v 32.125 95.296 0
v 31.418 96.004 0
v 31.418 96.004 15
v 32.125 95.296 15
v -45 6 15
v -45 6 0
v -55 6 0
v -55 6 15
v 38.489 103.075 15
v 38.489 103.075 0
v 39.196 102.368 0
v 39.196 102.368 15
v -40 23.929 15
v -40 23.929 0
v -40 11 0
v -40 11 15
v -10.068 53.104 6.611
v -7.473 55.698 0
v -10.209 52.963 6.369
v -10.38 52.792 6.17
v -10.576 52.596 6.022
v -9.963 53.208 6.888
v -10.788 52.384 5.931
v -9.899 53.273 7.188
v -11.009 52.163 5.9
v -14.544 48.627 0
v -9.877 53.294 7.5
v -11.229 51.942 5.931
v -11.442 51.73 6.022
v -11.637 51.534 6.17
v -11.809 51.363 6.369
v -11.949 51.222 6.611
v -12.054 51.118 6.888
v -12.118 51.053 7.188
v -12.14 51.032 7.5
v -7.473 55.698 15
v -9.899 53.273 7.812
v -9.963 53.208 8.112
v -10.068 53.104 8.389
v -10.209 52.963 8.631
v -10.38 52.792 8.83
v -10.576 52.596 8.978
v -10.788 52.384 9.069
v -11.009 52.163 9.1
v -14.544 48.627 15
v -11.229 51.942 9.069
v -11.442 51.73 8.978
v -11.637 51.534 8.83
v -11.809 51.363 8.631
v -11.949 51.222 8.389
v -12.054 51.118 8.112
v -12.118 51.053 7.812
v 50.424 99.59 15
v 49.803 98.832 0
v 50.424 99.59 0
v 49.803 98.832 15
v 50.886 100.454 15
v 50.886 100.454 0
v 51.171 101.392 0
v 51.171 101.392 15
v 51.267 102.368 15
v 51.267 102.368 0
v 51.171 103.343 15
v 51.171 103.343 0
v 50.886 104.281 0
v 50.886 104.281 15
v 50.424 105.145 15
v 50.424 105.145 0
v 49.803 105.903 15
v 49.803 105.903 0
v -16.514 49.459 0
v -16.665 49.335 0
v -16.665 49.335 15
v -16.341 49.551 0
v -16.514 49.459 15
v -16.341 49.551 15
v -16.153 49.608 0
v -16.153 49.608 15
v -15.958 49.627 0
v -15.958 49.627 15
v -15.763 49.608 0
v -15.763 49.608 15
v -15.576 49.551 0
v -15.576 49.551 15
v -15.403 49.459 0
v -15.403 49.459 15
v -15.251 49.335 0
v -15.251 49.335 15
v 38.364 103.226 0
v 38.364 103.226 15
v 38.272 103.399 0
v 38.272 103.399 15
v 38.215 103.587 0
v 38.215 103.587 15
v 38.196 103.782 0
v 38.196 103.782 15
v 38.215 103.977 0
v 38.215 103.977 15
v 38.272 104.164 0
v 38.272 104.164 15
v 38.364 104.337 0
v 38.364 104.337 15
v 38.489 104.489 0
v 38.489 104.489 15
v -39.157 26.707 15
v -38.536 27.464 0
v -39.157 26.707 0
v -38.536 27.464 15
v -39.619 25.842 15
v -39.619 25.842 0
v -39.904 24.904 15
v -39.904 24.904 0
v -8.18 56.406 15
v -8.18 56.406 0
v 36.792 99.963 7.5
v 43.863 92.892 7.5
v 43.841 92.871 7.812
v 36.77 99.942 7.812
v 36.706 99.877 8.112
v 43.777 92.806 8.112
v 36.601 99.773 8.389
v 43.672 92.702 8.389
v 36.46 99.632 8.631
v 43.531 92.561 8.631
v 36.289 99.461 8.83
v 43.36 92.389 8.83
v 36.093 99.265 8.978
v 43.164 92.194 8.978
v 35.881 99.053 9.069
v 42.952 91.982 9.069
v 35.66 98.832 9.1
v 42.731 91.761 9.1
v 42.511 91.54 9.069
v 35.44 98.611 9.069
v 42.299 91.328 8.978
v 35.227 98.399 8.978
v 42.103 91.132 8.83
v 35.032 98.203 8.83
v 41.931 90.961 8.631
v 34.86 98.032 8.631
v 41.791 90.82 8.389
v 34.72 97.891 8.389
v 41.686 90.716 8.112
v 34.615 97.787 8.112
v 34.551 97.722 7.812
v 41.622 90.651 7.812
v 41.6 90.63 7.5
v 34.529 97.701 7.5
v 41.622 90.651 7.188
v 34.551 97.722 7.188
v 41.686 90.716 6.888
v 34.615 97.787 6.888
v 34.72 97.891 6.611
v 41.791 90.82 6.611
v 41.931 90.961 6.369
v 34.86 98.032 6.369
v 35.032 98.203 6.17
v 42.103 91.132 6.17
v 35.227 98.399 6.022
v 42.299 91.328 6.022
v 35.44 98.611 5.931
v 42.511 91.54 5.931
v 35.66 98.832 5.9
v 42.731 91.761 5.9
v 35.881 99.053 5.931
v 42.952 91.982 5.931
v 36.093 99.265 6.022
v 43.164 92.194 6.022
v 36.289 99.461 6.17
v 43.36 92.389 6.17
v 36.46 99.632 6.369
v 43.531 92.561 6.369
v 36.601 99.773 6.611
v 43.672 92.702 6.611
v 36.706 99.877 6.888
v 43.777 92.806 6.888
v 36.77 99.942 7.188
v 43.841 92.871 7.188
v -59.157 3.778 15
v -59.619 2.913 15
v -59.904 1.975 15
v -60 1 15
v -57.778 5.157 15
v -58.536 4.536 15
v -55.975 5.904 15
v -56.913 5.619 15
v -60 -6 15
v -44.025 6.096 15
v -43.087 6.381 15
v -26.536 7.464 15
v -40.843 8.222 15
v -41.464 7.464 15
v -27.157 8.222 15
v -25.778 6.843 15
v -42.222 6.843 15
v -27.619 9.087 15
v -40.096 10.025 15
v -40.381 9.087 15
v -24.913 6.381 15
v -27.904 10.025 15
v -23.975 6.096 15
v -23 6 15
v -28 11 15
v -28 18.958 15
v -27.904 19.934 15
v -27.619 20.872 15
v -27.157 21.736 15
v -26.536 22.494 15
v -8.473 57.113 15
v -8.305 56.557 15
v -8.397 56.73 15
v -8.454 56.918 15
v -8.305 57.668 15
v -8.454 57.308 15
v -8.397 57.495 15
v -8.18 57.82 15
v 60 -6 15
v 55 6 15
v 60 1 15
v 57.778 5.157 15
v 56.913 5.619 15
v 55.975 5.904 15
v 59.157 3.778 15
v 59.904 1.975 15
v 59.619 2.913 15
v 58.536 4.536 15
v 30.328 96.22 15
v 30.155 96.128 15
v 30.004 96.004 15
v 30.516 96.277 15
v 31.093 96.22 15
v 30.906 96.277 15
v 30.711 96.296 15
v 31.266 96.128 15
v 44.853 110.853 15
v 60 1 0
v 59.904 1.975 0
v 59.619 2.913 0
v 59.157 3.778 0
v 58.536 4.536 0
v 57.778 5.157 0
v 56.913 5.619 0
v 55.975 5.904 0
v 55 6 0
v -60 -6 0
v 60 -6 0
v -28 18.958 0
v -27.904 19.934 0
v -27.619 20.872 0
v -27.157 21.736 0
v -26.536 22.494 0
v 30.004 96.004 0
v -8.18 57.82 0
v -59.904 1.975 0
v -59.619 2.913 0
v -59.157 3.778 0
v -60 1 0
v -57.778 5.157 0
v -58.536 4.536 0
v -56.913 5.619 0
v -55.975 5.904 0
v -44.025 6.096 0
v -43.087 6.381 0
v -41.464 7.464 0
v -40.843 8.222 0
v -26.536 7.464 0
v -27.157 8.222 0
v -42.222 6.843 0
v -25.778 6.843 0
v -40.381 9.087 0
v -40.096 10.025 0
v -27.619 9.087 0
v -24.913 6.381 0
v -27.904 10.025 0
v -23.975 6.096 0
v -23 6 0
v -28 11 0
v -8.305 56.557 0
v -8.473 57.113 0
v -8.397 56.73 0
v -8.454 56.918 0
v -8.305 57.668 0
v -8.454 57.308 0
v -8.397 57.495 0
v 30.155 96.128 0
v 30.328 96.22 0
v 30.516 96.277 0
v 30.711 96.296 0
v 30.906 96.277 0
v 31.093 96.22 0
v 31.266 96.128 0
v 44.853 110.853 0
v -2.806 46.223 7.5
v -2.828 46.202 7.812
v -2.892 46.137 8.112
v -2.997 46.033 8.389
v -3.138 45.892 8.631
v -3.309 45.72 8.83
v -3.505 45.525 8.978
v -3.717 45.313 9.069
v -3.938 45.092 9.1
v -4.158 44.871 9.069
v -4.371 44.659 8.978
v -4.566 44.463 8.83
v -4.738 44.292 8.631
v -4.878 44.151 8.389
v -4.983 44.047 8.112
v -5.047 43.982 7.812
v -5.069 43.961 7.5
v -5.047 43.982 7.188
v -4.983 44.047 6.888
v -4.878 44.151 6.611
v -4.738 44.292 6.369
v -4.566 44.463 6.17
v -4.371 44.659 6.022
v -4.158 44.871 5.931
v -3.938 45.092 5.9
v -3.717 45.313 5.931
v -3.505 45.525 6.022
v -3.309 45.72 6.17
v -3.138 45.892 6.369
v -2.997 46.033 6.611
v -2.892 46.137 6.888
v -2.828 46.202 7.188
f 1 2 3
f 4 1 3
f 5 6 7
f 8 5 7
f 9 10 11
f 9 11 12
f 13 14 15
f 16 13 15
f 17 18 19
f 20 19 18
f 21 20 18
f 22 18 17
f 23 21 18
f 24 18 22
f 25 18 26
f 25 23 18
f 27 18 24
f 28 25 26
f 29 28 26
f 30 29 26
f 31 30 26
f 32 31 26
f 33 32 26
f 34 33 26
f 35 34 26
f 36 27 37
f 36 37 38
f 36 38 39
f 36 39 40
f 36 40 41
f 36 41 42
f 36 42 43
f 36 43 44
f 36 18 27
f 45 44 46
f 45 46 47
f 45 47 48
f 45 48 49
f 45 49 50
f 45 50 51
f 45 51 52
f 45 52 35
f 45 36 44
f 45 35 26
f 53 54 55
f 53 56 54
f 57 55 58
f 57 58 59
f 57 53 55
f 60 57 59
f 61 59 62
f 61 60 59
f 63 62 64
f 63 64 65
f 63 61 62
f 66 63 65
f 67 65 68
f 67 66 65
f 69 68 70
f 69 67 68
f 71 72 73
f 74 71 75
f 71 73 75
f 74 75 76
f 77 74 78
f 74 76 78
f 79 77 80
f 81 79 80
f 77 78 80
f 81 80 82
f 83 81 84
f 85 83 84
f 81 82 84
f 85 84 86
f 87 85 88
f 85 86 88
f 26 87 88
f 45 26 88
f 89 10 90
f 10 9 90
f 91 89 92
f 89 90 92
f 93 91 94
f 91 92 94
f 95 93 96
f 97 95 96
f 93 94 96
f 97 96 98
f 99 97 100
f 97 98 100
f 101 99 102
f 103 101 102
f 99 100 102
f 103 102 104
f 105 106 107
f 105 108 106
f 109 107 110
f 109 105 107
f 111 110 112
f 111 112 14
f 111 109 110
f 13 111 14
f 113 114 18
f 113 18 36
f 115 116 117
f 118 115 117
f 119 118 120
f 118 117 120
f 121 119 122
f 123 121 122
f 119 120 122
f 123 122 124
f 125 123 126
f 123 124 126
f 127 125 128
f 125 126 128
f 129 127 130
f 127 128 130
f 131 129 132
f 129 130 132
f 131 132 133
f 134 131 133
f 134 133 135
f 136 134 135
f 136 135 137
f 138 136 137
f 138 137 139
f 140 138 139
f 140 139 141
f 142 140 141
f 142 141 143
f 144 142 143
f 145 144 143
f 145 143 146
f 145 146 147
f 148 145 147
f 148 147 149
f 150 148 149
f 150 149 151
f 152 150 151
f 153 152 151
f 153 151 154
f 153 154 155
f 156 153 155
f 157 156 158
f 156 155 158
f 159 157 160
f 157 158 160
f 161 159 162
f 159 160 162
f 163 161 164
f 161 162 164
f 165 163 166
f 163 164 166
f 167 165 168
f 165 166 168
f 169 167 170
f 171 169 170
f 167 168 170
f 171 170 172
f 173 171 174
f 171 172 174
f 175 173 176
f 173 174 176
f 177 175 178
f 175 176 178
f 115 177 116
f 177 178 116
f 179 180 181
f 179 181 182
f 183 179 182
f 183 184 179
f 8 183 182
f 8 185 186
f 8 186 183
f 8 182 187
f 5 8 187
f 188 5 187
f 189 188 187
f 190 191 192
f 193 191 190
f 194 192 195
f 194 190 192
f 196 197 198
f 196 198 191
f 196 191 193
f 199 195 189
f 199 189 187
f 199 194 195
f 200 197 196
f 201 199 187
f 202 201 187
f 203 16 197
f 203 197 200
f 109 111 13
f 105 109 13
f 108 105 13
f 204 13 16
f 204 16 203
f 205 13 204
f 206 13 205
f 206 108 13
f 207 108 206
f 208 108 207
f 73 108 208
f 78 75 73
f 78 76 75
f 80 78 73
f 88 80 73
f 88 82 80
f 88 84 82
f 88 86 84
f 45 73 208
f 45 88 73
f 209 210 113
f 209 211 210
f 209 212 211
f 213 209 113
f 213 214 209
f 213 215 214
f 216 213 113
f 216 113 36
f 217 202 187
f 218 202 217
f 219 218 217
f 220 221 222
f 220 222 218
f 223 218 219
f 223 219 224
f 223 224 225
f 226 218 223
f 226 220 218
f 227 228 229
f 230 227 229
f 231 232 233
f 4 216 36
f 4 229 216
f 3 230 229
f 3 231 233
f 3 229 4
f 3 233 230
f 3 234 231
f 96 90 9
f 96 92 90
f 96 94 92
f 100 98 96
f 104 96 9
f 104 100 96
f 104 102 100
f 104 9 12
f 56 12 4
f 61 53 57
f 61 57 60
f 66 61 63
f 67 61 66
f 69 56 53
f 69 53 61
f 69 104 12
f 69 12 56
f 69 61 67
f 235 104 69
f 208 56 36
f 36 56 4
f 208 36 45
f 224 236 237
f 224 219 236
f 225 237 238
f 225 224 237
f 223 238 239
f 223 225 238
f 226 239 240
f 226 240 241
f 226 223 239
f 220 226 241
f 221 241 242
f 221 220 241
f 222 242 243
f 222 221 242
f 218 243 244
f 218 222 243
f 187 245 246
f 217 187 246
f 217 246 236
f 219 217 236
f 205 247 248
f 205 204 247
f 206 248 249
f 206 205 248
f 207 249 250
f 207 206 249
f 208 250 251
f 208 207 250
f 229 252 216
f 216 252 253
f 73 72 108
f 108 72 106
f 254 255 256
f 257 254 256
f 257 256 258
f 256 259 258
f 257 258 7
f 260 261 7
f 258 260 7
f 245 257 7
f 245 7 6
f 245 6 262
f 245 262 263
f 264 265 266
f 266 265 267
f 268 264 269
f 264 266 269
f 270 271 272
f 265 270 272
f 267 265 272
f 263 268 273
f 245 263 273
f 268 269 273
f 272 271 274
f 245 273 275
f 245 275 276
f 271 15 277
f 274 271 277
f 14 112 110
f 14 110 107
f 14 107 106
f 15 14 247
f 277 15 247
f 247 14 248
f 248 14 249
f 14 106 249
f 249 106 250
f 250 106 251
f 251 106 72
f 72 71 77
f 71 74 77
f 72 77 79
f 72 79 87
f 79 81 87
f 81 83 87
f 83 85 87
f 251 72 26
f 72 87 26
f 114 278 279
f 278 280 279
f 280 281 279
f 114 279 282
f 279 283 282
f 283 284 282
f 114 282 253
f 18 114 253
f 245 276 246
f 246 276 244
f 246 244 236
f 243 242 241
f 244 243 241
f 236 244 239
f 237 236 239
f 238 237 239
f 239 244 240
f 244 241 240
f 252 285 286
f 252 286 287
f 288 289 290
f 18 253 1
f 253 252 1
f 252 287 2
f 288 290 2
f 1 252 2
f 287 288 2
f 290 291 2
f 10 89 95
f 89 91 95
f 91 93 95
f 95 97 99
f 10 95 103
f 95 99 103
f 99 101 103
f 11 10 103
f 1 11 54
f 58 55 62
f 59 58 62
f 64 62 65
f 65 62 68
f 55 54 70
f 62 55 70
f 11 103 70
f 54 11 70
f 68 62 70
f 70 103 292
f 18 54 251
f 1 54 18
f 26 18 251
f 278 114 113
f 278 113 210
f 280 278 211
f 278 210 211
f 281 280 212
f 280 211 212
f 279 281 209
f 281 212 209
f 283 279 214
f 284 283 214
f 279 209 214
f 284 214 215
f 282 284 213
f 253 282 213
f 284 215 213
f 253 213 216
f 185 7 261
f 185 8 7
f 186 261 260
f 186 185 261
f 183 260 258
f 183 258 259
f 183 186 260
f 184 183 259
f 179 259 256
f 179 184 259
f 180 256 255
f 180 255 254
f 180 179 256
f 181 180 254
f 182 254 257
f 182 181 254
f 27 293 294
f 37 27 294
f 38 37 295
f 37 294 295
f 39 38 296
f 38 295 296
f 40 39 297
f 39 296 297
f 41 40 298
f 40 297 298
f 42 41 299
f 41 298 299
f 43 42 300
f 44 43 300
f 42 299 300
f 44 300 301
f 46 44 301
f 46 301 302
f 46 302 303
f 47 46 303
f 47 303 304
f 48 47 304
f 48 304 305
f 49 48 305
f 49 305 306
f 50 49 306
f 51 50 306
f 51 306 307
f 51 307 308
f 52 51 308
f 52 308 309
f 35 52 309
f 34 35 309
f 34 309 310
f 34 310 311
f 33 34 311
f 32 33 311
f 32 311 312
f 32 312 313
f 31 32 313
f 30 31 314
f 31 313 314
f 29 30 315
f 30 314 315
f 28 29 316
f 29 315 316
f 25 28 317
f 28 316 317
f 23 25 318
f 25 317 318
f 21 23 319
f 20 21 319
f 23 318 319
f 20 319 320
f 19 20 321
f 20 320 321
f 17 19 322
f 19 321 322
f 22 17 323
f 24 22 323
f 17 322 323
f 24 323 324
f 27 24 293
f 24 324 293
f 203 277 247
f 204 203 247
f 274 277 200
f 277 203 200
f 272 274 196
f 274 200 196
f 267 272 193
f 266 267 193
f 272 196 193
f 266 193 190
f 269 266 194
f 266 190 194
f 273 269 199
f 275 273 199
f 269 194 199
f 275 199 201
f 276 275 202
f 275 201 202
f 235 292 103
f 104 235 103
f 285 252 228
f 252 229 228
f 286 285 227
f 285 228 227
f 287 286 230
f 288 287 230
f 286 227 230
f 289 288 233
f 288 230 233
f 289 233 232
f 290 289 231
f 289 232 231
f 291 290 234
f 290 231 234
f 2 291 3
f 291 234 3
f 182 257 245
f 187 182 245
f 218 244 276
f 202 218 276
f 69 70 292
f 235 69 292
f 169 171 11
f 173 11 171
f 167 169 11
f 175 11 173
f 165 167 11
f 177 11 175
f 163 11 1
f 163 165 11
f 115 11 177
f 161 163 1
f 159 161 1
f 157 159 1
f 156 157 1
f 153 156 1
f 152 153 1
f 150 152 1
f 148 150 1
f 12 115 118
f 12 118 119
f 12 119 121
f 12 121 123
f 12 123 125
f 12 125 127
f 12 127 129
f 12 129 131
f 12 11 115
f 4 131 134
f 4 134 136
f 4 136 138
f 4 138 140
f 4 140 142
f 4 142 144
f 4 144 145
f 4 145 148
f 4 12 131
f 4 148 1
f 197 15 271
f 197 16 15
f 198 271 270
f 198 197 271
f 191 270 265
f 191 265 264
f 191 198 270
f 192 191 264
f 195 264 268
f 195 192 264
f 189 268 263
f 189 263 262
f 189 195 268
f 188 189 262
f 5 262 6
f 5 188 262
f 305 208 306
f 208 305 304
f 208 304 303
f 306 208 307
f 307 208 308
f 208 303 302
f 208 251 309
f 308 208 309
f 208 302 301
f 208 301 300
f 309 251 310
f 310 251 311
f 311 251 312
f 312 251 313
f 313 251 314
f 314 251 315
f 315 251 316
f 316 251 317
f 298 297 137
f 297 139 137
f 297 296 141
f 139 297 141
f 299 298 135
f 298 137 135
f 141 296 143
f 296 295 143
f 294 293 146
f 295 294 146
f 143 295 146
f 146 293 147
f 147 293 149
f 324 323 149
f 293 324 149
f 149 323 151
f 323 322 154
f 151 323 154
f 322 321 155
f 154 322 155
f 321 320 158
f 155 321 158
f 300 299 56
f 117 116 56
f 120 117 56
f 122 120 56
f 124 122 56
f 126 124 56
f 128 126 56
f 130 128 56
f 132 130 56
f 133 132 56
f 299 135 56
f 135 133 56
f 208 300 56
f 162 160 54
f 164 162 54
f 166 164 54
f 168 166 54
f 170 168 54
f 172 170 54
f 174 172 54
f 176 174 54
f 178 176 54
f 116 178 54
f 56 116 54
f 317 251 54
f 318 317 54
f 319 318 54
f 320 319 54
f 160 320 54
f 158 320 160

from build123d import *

# Parameters (mm, degrees)
F1_DEPTH = 15
F2_R     = 5
F3_W     = 10
F3_H     = 15
F4_DEPTH = 2
F5_D     = 3.2
F5_DEPTH = 25
F5_TIP   = 0.9613769904
F6_R     = 1


with BuildPart() as f1:
    # F0 (on Top) → F1 (new body)
    with BuildSketch(Plane.XY):
        Polygon((-40, 6), (-28, 6), (-28, 21.0294372515), (53.3380951166, 102.3675323681), (44.8528137424, 110.8528137424), (-40, 26), align=None)
        Polygon((-60, -6), (60, -6), (60, 6), (-28, 6), (-40, 6), (-60, 6), align=None)
    extrude(amount=F1_DEPTH)

    # F2
    f2_edges = [f1.edges().sort_by_distance(p)[0] for p in [
        (-40, 6, 7.5),
        (-28, 6, 7.5),
        (-60, 6, 7.5),
        (60, 6, 7.5),
        (53.338095, 102.367532, 7.5),
        (-40, 26, 7.5),
        (-28, 21.029437, 7.5),
    ]]
    fillet(f2_edges, radius=F2_R)

    # F3 (on face) → F4 (cut)
    with BuildSketch(Plane(origin=(-33, 33, 0), x_dir=(-0.7071067812, -0.7071067812, 0), z_dir=(-0.7071067812, 0.7071067812, 0))):
        with Locations((-95.1005050634, 7.5)):
            Rectangle(F3_W, F3_H)
        with Locations((-29.1005050634, 7.5)):
            Rectangle(F3_W, F3_H)
    extrude(amount=-F4_DEPTH, mode=Mode.SUBTRACT)

    # F5
    with Locations(Plane(origin=(-33, 33, 0), x_dir=(-0.7071067812, -0.7071067812, 0), z_dir=(-0.7071067812, 0.7071067812, 0))):
        with Locations((-95.1005050634, 7.5), (-29.1005050634, 7.5)):
            Hole(F5_D / 2, depth=F5_DEPTH)
            with Locations((0, 0, -(F5_DEPTH + F5_TIP / 2))):  # 118° drill point
                Cone(0, F5_D / 2, F5_TIP, mode=Mode.SUBTRACT)

    # F6
    f6_edges = [f1.edges().sort_by_distance(p)[0] for p in [
        (37.781746, 103.781746, 7.5),
        (30.710678, 96.710678, 7.5),
        (-8.887302, 57.112698, 7.5),
        (-15.958369, 50.041631, 7.5),
    ]]
    fillet(f6_edges, radius=F6_R)


solid = f1.part
